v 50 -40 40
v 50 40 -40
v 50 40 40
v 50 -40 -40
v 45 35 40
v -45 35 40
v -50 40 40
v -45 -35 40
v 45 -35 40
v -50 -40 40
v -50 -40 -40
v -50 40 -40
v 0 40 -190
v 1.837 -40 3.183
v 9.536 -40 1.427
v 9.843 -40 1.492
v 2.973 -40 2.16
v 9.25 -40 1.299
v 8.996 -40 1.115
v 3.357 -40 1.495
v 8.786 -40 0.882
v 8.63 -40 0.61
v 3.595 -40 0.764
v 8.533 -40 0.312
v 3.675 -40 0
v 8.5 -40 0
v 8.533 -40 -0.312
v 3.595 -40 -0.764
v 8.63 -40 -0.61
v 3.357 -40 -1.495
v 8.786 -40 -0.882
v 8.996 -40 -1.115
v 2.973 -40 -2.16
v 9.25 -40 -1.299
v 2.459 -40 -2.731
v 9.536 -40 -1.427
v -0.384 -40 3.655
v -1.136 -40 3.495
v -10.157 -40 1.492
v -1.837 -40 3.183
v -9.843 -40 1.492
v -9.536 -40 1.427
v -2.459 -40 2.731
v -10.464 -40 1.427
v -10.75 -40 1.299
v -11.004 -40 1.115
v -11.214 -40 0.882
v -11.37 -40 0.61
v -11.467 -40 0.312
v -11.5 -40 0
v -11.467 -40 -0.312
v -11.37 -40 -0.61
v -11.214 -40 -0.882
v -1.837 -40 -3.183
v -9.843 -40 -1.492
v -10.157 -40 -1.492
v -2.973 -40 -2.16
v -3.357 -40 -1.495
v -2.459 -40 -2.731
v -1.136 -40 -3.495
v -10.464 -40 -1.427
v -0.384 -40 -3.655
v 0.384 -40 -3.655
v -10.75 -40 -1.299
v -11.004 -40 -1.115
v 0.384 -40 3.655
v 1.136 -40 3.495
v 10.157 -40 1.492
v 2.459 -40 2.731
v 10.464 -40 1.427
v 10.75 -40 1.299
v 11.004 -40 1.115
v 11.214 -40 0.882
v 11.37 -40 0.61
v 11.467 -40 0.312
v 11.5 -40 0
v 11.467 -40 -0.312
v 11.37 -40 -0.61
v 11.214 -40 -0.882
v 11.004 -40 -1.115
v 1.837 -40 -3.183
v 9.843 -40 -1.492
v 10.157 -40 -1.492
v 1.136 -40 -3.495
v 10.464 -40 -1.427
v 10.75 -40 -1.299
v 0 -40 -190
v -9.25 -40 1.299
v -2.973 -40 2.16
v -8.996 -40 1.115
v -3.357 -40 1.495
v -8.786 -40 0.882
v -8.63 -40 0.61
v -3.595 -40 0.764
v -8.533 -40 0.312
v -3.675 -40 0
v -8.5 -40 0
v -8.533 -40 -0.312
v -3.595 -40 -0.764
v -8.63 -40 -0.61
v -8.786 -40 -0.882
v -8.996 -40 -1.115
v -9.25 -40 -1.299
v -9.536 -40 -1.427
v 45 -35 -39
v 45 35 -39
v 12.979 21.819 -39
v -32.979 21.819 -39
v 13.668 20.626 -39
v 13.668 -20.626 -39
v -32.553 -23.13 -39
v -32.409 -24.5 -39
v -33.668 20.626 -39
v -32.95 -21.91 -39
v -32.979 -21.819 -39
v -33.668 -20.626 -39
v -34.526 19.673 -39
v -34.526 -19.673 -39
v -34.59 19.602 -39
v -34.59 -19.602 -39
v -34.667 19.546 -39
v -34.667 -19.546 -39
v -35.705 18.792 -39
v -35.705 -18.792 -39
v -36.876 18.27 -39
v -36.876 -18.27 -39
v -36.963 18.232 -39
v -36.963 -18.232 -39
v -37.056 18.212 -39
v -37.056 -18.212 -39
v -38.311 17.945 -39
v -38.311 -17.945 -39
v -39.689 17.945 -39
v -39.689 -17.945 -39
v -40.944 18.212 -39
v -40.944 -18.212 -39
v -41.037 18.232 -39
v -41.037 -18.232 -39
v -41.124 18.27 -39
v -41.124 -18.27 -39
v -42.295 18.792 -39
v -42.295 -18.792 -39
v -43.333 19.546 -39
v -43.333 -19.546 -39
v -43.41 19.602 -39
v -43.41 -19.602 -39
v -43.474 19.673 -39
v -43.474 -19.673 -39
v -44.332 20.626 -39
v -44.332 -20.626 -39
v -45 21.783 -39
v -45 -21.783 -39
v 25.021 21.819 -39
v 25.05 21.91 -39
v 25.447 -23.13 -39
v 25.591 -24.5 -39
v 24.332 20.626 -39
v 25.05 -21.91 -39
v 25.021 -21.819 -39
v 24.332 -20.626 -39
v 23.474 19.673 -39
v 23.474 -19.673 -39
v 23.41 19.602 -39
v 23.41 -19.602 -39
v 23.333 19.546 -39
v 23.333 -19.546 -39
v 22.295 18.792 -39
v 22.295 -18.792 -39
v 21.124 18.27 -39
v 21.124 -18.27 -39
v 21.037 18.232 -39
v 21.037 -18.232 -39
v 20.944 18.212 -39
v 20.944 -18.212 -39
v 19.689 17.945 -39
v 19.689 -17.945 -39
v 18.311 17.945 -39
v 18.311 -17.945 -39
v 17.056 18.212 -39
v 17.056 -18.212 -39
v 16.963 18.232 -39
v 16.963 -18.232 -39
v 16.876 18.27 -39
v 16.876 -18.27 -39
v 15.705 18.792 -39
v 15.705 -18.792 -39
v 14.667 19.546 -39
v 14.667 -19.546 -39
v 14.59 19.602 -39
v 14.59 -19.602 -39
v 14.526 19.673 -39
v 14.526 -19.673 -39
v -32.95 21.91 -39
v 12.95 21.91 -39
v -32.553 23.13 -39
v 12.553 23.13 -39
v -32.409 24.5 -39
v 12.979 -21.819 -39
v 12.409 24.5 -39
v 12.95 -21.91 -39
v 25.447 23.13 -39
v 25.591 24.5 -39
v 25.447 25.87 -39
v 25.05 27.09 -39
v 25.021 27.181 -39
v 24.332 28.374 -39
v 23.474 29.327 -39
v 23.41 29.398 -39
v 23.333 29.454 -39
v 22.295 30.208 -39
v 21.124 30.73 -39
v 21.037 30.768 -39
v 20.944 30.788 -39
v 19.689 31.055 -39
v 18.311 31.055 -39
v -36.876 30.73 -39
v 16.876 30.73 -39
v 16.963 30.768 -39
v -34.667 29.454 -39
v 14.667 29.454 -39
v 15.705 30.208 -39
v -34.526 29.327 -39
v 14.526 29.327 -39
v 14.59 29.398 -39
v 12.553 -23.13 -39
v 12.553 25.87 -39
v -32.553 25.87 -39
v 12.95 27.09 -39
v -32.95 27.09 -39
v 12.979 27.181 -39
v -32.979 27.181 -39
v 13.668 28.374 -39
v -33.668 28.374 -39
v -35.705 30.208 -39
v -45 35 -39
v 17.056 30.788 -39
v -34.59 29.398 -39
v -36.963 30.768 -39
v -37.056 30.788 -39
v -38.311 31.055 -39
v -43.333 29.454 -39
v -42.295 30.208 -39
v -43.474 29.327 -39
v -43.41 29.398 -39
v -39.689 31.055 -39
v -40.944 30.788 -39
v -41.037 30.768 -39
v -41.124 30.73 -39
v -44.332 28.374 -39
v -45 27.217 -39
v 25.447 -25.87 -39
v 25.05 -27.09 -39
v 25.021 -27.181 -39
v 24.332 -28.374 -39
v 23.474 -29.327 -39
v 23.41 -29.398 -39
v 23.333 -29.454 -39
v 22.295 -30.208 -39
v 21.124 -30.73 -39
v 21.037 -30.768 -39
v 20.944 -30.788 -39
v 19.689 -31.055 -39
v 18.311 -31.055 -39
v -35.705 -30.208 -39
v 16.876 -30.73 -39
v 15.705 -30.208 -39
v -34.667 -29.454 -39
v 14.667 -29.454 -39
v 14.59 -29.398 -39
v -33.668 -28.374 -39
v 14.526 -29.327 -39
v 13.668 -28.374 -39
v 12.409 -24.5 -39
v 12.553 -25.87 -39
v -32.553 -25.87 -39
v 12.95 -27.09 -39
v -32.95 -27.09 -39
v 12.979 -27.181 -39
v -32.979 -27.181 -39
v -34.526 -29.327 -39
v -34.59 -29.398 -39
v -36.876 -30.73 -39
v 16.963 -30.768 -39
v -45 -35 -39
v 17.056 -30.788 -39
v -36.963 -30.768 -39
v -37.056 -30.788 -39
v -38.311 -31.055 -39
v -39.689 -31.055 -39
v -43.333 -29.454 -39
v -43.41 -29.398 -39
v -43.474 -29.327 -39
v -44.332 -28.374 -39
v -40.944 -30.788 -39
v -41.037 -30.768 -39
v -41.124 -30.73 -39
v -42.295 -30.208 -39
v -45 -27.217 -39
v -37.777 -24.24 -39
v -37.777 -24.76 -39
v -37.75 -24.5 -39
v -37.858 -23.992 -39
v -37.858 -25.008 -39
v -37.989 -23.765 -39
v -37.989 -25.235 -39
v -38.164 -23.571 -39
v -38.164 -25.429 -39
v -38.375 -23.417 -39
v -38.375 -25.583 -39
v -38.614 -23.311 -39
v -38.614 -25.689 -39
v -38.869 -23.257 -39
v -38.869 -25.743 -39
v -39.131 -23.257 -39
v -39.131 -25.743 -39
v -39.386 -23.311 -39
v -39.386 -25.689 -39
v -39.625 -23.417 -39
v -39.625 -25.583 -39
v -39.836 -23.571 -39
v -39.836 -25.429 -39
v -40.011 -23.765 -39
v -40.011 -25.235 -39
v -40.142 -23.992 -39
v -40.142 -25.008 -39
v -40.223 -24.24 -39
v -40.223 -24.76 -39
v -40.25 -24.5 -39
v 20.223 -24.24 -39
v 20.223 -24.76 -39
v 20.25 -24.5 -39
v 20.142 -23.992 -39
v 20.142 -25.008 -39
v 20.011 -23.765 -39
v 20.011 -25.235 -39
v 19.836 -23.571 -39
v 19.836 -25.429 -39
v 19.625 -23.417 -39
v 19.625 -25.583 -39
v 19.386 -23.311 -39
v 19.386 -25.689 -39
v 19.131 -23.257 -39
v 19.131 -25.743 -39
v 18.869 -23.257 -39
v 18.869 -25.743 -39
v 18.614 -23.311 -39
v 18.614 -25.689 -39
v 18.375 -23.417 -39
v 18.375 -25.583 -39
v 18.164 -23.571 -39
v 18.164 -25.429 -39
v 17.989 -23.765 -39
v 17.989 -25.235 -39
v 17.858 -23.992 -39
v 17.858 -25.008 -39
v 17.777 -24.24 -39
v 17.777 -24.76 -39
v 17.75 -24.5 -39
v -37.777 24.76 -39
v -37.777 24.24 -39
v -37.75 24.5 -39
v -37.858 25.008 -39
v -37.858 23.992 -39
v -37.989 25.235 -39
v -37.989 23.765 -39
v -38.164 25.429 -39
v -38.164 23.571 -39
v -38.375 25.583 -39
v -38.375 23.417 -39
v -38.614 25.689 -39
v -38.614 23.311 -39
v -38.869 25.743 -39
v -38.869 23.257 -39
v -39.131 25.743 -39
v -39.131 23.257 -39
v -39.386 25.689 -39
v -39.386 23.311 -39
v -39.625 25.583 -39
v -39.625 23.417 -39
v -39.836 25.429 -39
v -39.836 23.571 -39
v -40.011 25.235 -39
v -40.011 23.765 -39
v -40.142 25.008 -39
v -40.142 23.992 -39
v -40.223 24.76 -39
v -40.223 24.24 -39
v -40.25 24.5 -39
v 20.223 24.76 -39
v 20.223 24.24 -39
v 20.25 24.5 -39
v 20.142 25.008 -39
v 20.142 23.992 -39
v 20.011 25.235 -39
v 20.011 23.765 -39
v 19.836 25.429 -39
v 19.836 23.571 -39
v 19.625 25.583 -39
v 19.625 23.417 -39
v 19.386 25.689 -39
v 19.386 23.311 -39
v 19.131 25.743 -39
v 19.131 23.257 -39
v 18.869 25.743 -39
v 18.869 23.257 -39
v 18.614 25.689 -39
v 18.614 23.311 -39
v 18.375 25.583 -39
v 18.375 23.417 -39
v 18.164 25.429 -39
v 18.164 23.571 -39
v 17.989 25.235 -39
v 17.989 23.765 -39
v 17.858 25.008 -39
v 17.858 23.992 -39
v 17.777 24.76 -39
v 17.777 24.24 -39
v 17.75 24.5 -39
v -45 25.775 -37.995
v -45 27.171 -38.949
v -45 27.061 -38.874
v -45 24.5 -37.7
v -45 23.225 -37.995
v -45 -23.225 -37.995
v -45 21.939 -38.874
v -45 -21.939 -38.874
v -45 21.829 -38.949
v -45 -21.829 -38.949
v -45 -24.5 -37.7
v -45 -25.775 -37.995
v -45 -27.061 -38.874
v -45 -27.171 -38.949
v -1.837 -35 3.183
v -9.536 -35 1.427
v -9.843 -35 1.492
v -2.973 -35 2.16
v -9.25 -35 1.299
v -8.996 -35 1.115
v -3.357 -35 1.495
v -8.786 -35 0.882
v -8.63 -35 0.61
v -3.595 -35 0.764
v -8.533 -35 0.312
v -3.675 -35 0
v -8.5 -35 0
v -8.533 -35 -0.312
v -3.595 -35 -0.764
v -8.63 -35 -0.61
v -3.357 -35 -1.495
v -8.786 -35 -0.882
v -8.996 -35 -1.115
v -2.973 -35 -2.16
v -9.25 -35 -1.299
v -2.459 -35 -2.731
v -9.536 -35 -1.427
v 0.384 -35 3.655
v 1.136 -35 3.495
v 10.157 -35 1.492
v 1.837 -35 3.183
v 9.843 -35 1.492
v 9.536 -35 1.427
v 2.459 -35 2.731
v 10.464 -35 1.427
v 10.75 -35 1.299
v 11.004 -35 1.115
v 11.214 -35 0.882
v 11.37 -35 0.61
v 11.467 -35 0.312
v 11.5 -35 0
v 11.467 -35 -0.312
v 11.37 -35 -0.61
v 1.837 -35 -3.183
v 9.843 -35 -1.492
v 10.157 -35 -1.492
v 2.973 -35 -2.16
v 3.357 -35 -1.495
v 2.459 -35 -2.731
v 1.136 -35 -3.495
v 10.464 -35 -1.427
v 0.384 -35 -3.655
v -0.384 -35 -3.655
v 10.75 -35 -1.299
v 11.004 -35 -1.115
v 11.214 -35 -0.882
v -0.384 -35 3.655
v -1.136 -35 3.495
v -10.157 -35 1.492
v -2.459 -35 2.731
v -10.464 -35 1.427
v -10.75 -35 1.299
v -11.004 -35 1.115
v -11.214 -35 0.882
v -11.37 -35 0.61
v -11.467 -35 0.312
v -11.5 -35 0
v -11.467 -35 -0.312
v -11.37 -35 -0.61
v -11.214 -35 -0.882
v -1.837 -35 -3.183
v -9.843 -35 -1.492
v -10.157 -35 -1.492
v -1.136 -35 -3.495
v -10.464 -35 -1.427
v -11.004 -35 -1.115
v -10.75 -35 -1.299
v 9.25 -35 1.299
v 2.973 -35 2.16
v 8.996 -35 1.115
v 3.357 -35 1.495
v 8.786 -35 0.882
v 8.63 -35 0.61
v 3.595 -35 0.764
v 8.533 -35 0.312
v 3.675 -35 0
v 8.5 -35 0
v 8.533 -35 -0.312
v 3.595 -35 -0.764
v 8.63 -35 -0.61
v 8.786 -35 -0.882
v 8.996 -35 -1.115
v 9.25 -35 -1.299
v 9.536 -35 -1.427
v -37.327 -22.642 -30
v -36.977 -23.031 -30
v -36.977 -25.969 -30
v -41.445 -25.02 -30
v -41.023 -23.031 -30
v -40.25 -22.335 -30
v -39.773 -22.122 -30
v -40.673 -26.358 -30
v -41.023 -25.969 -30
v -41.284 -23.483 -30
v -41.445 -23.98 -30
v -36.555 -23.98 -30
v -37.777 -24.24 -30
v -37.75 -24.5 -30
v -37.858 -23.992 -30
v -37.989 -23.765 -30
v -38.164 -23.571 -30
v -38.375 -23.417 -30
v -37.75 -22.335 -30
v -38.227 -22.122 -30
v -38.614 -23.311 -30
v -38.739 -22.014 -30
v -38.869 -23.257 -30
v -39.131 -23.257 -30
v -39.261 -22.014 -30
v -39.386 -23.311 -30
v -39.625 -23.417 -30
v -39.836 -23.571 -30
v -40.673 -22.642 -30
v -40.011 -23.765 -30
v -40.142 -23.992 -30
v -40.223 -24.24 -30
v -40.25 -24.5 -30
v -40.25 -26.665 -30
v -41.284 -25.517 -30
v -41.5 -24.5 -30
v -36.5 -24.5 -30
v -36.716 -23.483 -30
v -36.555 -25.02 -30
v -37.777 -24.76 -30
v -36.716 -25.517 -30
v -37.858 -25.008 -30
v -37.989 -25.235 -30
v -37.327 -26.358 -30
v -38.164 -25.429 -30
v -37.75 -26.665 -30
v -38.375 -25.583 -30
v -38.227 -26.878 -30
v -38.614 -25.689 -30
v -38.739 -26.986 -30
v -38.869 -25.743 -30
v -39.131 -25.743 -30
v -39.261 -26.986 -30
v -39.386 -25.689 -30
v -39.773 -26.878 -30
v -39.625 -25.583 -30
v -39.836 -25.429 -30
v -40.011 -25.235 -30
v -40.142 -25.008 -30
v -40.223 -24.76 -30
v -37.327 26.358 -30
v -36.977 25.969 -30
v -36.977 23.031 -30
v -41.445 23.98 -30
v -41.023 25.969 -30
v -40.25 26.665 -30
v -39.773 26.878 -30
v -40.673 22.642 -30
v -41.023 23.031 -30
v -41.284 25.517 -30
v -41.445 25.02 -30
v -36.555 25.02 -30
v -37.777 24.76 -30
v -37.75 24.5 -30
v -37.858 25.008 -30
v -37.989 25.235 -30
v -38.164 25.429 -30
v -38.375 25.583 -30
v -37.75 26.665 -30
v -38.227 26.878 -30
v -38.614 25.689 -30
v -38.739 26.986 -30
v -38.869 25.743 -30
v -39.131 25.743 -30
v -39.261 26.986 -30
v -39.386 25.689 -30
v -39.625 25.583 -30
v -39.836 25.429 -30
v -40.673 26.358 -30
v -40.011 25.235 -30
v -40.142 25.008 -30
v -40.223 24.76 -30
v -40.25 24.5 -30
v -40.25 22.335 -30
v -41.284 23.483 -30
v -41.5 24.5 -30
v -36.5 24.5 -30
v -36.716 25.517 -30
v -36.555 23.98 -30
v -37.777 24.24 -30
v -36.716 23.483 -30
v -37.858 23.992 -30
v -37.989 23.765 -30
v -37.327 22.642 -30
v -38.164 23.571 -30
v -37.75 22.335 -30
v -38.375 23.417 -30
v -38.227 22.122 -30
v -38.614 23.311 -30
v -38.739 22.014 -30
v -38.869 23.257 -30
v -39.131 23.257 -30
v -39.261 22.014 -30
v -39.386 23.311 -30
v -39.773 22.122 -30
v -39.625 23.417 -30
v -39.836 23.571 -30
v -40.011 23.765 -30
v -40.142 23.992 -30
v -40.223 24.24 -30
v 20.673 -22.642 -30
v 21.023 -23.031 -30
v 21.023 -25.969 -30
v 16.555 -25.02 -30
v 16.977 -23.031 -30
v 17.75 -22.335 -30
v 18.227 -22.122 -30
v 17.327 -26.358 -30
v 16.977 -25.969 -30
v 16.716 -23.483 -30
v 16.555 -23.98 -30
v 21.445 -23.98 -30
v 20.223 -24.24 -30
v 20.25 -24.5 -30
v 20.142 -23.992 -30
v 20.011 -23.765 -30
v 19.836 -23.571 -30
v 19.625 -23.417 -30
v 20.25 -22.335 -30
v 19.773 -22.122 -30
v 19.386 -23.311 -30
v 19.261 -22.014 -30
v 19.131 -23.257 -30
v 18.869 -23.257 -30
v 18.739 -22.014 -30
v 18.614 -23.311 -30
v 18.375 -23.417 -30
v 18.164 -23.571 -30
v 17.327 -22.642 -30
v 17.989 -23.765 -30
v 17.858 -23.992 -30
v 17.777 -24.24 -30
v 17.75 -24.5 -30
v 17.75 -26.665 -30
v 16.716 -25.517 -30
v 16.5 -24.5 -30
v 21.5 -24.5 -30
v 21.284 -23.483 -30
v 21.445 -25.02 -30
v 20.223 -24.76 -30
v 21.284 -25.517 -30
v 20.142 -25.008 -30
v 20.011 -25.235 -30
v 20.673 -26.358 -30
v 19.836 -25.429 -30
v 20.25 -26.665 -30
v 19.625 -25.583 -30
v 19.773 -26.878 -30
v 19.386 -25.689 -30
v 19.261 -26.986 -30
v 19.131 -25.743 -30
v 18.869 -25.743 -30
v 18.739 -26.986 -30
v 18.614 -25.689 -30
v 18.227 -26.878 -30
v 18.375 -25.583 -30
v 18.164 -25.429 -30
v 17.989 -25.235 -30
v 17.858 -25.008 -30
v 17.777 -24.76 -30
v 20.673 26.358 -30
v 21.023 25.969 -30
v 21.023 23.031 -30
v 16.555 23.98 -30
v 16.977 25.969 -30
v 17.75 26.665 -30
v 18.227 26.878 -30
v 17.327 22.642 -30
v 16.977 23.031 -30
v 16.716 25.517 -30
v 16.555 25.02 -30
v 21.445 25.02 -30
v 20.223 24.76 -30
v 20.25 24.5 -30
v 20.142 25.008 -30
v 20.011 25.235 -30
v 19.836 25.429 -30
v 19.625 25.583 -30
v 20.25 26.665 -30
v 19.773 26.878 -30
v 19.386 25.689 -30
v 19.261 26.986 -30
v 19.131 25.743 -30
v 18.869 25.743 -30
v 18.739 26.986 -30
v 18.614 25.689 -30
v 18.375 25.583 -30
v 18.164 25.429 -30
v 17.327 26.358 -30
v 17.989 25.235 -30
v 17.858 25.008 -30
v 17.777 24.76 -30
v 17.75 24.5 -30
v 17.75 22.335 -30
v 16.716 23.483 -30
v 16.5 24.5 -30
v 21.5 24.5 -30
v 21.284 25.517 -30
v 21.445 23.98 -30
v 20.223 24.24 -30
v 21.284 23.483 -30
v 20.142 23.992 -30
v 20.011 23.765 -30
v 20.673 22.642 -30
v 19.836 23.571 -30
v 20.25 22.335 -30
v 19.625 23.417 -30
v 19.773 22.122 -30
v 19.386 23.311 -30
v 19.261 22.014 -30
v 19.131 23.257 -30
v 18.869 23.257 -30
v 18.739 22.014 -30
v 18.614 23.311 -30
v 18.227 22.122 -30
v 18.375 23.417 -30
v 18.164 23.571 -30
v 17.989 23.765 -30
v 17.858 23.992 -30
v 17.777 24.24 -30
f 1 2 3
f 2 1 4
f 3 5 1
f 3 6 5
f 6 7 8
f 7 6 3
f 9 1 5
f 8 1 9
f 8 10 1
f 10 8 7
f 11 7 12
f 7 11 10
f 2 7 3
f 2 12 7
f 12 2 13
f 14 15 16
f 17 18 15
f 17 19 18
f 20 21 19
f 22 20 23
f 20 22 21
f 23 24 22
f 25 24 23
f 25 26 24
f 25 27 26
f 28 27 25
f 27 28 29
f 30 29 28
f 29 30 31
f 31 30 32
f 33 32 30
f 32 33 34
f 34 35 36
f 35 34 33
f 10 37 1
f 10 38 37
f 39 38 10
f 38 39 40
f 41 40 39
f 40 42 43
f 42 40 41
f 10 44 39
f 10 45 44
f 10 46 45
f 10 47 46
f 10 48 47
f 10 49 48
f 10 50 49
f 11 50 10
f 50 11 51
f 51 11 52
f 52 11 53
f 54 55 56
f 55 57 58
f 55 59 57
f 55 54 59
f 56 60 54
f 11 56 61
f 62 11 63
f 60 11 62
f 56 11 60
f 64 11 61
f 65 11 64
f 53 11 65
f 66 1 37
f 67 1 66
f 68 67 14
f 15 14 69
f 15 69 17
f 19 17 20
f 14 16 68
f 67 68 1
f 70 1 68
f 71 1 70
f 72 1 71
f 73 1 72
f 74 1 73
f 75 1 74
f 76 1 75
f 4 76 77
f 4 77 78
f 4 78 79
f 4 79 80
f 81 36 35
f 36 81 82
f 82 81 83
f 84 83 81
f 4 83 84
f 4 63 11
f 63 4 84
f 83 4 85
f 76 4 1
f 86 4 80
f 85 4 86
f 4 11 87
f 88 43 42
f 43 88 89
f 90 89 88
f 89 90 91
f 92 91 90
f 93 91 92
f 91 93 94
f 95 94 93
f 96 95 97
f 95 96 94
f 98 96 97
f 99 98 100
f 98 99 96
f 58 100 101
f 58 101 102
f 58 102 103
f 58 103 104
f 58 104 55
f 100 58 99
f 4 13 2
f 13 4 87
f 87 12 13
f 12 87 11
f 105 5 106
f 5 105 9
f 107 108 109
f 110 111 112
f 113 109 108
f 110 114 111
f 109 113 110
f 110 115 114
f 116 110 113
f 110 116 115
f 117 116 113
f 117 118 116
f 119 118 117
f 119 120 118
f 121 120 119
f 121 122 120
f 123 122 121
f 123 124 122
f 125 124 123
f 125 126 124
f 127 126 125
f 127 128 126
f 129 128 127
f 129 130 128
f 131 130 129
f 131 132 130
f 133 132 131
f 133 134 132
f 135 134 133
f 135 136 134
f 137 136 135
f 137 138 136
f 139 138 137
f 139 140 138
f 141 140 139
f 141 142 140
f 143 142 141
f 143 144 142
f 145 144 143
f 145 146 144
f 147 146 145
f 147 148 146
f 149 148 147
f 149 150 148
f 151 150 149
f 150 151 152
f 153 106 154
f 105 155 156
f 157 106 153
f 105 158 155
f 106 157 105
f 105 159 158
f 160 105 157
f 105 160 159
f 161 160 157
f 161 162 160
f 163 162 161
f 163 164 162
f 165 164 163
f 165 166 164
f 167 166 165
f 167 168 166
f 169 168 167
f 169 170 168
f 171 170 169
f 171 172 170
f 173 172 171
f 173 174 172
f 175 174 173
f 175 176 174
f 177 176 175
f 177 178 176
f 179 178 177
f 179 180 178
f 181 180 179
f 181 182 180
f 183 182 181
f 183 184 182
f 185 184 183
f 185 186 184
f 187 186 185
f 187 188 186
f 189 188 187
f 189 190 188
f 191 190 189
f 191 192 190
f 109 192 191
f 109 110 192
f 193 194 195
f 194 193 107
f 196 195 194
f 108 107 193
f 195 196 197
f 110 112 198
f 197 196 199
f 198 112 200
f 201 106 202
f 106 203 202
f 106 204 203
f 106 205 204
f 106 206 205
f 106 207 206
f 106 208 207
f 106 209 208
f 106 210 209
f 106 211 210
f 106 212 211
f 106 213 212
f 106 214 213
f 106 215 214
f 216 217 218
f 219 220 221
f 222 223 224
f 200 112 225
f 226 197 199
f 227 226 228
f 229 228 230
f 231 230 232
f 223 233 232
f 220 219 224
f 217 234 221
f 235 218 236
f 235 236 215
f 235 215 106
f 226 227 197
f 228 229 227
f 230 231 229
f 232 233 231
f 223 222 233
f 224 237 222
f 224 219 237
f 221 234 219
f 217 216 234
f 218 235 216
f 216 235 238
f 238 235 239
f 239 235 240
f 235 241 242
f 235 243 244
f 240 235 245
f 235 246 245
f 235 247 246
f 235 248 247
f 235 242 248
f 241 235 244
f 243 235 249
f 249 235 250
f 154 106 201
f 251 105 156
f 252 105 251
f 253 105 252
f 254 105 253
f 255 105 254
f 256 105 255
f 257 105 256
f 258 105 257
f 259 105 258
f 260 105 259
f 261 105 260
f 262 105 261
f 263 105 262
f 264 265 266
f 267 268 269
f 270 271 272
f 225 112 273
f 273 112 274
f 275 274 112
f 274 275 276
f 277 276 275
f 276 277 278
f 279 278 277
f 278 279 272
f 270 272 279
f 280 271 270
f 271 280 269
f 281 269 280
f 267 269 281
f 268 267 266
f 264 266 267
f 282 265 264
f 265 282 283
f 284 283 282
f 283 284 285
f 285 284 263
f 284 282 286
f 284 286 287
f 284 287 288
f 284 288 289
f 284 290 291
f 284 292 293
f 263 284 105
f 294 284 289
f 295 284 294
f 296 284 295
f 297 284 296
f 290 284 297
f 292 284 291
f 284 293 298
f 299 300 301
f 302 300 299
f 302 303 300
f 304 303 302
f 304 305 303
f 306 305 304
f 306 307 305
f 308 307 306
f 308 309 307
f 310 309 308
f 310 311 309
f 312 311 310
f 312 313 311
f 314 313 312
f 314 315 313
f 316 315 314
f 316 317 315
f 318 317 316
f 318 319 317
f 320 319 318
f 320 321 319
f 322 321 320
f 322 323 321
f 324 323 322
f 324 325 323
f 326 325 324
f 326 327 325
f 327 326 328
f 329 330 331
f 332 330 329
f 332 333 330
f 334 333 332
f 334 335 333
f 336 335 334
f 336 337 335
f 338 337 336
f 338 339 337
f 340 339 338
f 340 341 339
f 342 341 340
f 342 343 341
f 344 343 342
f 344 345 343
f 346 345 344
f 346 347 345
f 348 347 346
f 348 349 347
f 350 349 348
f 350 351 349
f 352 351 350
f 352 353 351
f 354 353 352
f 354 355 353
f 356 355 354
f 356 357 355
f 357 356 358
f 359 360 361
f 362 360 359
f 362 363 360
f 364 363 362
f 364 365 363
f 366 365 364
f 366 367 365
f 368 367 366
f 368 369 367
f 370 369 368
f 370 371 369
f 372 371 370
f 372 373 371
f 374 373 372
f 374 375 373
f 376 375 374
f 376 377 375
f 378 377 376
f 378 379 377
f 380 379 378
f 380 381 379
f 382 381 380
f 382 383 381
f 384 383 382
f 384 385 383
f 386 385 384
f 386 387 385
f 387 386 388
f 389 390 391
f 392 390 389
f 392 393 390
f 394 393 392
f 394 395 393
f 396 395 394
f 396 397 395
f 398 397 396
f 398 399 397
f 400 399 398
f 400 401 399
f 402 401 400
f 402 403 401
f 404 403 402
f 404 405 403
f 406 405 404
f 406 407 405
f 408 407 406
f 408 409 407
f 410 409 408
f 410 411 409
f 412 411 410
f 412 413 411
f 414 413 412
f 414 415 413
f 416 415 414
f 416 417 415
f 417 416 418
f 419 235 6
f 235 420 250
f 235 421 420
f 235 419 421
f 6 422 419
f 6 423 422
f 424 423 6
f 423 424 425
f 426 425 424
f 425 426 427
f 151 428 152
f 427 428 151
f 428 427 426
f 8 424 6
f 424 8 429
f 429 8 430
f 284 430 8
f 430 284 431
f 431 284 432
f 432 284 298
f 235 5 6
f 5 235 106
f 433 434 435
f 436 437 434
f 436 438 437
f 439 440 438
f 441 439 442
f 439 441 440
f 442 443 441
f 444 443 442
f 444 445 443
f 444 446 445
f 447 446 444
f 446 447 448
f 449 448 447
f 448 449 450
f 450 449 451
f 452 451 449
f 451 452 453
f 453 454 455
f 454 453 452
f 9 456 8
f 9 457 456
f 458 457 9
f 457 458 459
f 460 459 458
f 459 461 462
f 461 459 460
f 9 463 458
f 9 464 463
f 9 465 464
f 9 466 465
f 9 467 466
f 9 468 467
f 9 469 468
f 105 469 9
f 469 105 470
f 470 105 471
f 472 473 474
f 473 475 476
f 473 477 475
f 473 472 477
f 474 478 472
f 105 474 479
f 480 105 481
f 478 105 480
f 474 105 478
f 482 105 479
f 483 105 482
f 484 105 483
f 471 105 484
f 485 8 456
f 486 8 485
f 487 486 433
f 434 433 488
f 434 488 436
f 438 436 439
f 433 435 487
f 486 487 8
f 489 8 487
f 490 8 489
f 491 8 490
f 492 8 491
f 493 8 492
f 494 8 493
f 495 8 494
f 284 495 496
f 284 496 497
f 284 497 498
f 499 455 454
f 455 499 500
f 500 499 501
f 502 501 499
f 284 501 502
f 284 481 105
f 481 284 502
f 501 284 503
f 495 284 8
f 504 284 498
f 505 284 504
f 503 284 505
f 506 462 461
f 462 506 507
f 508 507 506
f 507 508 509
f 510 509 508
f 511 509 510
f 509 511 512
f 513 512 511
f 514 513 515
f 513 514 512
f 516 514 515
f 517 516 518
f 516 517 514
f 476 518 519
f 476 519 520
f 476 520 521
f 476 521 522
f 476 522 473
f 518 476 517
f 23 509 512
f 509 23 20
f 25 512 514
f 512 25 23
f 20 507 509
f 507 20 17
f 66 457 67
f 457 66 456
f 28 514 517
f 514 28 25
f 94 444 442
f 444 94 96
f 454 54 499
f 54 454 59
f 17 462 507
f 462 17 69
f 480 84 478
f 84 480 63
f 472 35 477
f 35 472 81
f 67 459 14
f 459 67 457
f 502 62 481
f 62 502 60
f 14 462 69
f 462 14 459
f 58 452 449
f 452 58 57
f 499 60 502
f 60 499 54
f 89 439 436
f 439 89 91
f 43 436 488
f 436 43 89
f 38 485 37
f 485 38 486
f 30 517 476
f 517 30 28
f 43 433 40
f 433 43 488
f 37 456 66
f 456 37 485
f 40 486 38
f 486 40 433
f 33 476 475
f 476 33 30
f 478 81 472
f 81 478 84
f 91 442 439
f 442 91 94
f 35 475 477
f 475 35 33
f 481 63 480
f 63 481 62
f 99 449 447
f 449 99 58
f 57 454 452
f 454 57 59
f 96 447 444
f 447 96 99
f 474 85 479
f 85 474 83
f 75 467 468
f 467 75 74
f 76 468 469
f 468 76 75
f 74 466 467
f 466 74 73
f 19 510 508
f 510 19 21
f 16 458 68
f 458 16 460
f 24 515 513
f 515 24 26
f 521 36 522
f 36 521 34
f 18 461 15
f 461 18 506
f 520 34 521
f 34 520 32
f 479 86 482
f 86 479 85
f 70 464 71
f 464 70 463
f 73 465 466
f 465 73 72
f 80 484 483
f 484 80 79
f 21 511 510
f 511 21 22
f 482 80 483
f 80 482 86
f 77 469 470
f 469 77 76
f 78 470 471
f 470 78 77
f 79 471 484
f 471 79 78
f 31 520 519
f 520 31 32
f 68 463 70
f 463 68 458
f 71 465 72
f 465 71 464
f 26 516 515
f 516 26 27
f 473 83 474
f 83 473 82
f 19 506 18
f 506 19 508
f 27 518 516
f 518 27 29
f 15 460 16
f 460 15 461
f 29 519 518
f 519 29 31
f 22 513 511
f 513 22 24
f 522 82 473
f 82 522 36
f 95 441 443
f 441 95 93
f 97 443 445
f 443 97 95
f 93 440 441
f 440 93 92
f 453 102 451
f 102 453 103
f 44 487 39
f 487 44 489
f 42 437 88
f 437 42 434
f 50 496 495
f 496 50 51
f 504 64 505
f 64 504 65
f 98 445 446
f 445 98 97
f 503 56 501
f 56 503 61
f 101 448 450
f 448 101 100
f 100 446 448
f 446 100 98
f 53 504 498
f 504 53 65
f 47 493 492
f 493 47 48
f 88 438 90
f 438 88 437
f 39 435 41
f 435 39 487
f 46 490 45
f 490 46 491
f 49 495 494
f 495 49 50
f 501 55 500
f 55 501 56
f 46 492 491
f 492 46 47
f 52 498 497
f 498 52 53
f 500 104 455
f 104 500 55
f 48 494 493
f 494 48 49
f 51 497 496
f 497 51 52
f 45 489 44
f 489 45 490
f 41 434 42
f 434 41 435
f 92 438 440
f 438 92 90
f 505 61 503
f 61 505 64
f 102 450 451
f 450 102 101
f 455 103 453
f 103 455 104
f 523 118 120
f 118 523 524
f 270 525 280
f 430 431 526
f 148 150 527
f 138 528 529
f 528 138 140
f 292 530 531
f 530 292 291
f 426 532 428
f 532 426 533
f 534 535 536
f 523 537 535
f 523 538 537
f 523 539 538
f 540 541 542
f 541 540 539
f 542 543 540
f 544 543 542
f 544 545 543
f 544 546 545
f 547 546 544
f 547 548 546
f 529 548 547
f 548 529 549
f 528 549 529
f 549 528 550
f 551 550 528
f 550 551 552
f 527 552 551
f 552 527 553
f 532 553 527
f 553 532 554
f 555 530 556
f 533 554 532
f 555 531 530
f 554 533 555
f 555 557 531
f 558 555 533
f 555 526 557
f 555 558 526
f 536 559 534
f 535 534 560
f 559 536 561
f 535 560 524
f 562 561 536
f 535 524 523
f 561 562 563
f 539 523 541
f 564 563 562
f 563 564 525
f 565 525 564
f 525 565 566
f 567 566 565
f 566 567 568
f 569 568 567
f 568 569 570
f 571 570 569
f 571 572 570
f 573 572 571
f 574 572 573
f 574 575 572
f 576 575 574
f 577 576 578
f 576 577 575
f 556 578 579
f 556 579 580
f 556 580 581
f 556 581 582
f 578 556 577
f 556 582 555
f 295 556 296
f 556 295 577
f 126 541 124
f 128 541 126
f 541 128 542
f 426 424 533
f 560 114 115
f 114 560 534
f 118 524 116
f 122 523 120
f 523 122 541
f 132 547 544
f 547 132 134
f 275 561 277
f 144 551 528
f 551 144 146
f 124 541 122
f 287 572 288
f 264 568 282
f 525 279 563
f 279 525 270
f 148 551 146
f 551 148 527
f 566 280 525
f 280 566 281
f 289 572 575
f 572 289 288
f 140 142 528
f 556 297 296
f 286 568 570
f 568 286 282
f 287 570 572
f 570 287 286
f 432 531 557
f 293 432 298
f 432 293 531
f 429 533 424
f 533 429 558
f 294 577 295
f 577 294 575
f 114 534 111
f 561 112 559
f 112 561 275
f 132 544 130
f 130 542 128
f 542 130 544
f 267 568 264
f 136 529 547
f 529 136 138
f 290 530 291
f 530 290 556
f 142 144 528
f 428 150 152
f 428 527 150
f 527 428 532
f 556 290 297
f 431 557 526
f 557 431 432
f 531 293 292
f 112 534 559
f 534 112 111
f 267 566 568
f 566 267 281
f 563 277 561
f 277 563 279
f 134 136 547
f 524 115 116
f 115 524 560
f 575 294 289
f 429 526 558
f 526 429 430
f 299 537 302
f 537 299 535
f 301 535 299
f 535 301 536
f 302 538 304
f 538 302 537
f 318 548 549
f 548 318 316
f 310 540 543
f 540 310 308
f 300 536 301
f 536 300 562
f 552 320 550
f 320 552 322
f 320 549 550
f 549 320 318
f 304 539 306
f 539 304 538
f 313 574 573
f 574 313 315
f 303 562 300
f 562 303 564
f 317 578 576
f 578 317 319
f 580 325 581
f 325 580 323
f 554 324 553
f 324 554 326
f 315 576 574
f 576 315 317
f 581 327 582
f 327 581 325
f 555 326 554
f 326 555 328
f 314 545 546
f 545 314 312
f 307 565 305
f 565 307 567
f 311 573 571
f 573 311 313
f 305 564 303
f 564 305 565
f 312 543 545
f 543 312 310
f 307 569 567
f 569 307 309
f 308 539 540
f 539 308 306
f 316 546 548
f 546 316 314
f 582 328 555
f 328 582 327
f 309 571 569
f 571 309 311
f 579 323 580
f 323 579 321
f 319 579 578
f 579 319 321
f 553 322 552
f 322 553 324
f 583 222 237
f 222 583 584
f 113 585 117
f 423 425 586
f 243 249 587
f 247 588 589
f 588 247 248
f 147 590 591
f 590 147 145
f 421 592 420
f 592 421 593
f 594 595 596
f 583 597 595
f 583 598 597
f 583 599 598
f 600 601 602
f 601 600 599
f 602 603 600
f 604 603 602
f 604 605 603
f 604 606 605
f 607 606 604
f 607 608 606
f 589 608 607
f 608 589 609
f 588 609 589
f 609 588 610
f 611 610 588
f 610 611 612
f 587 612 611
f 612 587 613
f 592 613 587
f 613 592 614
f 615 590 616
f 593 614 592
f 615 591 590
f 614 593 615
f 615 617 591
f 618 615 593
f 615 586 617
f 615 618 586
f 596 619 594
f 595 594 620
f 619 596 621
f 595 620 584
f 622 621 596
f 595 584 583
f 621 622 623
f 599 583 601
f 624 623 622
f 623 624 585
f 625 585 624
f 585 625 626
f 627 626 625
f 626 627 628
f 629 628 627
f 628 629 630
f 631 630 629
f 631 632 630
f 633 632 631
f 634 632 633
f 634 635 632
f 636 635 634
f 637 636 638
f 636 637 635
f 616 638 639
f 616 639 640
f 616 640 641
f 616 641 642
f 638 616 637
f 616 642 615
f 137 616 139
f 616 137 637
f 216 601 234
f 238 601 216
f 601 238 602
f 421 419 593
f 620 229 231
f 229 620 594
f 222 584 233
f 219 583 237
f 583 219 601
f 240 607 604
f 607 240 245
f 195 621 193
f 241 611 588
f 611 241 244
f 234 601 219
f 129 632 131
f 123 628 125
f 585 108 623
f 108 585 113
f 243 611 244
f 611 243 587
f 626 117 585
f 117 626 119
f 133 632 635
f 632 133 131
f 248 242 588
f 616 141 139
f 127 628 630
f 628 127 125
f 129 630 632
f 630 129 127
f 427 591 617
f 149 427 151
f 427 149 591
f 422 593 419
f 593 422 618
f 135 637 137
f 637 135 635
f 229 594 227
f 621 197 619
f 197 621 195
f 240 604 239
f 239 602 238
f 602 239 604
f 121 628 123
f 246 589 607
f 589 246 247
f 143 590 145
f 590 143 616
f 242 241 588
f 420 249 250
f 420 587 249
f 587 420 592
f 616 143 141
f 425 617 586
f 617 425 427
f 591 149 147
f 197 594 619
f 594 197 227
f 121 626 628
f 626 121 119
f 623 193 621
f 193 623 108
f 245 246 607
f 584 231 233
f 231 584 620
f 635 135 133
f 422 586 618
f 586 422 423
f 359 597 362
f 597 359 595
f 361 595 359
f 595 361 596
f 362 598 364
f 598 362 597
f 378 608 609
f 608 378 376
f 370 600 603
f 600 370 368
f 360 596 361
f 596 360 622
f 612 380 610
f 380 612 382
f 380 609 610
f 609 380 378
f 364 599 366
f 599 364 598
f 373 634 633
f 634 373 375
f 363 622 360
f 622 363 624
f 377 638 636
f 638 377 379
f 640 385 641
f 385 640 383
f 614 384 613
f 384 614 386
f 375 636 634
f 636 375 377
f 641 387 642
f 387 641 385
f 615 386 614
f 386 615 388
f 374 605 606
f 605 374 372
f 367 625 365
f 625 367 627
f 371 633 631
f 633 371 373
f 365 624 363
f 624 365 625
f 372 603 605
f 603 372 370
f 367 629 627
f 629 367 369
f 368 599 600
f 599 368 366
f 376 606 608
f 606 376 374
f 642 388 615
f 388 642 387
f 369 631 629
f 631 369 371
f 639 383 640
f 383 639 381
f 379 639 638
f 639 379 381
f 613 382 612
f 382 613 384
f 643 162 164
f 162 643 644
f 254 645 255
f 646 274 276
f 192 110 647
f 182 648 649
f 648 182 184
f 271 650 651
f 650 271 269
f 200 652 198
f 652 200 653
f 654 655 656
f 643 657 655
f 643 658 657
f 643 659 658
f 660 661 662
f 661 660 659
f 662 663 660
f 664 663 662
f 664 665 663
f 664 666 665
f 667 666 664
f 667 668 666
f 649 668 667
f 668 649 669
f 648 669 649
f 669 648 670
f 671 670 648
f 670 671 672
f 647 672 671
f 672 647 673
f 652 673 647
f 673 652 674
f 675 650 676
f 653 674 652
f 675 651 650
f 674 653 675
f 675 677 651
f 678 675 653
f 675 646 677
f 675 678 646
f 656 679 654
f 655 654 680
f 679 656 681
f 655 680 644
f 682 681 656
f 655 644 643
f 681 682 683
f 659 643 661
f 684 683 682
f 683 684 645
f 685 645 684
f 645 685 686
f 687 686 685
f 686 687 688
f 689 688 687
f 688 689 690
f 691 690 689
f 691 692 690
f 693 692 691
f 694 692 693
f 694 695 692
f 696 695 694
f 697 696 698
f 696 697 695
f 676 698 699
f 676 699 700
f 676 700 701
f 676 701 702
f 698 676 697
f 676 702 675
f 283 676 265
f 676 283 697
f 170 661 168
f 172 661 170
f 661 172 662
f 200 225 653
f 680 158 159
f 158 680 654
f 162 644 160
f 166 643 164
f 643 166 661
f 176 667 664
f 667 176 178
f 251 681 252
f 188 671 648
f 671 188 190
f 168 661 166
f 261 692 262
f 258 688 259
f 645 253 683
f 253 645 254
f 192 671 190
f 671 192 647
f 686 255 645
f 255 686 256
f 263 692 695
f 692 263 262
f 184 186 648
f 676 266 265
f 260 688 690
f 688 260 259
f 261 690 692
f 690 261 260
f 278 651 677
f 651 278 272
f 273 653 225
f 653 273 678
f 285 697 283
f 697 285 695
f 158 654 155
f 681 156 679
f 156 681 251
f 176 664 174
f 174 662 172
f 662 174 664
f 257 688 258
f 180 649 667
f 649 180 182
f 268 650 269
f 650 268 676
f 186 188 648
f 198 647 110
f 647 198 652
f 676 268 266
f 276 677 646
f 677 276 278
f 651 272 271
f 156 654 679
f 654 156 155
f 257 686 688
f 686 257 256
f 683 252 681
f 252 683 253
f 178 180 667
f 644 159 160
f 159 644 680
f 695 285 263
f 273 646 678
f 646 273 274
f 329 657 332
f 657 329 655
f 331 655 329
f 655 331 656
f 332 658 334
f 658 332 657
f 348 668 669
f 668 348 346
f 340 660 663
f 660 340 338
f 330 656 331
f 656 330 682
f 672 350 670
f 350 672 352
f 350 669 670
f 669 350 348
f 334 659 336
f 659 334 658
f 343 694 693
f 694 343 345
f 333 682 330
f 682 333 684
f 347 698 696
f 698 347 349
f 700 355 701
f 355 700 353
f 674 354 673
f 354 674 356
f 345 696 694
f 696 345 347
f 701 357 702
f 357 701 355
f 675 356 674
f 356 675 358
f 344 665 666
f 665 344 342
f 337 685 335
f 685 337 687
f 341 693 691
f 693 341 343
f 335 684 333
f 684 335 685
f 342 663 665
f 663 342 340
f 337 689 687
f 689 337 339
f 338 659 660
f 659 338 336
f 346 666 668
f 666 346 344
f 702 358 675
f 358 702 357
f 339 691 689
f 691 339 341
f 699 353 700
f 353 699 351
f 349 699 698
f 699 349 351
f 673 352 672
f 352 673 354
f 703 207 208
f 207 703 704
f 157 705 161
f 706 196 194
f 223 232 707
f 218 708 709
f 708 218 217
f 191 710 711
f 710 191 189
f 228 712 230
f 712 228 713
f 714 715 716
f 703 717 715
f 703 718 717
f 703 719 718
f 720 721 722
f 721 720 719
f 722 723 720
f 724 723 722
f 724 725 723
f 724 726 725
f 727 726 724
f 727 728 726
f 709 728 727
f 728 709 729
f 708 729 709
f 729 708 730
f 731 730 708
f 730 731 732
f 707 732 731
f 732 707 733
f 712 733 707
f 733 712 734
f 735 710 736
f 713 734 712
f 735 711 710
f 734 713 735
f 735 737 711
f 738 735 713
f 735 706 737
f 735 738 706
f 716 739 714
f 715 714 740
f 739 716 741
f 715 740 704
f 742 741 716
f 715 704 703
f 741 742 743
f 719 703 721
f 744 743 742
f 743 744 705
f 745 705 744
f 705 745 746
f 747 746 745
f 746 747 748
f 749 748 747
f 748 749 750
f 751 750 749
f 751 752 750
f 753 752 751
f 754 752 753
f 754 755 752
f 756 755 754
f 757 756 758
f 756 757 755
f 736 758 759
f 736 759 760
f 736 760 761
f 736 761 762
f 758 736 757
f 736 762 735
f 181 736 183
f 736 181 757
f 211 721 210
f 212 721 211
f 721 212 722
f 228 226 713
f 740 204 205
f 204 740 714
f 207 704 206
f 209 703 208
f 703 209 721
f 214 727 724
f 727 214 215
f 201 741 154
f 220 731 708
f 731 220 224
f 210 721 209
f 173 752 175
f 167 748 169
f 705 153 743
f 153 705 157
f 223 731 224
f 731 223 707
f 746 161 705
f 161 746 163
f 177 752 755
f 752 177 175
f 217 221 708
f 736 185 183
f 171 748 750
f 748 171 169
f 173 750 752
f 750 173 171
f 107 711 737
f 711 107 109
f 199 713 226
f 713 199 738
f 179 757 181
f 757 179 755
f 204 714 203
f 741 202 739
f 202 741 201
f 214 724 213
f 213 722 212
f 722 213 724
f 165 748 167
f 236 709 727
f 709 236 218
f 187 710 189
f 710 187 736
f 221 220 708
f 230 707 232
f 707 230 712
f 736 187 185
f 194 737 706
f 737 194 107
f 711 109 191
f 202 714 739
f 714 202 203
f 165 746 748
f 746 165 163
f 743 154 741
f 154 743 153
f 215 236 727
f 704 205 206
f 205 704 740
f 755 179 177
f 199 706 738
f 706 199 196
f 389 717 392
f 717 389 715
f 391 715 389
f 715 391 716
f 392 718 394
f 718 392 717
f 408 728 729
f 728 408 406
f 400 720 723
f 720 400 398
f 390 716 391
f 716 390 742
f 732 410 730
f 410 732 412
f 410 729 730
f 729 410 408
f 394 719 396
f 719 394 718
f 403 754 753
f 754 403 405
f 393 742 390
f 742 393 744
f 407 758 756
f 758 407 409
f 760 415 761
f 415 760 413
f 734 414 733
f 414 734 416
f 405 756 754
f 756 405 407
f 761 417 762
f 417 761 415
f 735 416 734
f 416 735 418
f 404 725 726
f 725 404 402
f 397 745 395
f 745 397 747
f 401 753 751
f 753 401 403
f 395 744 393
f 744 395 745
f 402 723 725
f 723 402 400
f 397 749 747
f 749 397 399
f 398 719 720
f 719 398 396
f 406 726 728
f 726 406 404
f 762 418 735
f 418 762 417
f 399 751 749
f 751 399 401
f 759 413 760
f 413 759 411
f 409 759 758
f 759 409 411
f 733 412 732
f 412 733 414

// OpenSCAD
$fs=0.25;
width = 100;
depth = 80;
height = 80;
tri_height = 150;
wall_width = 5;
mot_scale = 1.05;
amot_len=52;
amot_d=25;
mot_len = mot_scale*amot_len;
mot_d = mot_scale*amot_d;
mot_r=mot_d/2;
amot_nib_d = 7;
amot_nib_len=12;
mot_nib_len = mot_scale*amot_nib_len;
mot_nib_d = mot_scale*amot_nib_d;
mot_nib_r=mot_nib_d/2;
tri_hyp = sqrt(tri_height^2+(width/2)^2);
mot_bol_of=10;
mot_bol_r=1.5;
pi_pos=[[0,0],[0,49],[58,0],[58,49]];
module pi_standoff(d=2.5){
    translate([0,0,-1])
    difference(){
    cylinder(h=11,r2=d,r1=d+5);
    translate([0,0,2])cylinder(h=11,r=d/2);
    }
    }
difference(){
difference(){
union(){
cube([width,depth,height],center=true);
translate([0,-depth/2,-height/2])rotate([-90,0,0])linear_extrude(depth)polygon([[width/2,0],[-width/2,0],[0,tri_height]]);
}
translate([0,0,2])cube([width-2*wall_width,depth-2*wall_width,height+2],center=true);
}
translate([0,wall_width-depth/2+mot_len,0])rotate([90,0,0])
union(){
cylinder(h=mot_len,r=mot_r);
translate([0,0,mot_len-1])
    union(){
        cylinder(h=mot_nib_len+1,r=mot_nib_r);
        translate([mot_bol_of,0,0])cylinder(h=mot_nib_len+1,r=mot_bol_r);
        translate([-mot_bol_of,0,0])cylinder(h=mot_nib_len+1,r=mot_bol_r);
    }
}
}
translate([3.5-85/2,3.5-56/2,-height/2])
for(pos=pi_pos){
   translate([pos.x,pos.y,0])pi_standoff();
}
